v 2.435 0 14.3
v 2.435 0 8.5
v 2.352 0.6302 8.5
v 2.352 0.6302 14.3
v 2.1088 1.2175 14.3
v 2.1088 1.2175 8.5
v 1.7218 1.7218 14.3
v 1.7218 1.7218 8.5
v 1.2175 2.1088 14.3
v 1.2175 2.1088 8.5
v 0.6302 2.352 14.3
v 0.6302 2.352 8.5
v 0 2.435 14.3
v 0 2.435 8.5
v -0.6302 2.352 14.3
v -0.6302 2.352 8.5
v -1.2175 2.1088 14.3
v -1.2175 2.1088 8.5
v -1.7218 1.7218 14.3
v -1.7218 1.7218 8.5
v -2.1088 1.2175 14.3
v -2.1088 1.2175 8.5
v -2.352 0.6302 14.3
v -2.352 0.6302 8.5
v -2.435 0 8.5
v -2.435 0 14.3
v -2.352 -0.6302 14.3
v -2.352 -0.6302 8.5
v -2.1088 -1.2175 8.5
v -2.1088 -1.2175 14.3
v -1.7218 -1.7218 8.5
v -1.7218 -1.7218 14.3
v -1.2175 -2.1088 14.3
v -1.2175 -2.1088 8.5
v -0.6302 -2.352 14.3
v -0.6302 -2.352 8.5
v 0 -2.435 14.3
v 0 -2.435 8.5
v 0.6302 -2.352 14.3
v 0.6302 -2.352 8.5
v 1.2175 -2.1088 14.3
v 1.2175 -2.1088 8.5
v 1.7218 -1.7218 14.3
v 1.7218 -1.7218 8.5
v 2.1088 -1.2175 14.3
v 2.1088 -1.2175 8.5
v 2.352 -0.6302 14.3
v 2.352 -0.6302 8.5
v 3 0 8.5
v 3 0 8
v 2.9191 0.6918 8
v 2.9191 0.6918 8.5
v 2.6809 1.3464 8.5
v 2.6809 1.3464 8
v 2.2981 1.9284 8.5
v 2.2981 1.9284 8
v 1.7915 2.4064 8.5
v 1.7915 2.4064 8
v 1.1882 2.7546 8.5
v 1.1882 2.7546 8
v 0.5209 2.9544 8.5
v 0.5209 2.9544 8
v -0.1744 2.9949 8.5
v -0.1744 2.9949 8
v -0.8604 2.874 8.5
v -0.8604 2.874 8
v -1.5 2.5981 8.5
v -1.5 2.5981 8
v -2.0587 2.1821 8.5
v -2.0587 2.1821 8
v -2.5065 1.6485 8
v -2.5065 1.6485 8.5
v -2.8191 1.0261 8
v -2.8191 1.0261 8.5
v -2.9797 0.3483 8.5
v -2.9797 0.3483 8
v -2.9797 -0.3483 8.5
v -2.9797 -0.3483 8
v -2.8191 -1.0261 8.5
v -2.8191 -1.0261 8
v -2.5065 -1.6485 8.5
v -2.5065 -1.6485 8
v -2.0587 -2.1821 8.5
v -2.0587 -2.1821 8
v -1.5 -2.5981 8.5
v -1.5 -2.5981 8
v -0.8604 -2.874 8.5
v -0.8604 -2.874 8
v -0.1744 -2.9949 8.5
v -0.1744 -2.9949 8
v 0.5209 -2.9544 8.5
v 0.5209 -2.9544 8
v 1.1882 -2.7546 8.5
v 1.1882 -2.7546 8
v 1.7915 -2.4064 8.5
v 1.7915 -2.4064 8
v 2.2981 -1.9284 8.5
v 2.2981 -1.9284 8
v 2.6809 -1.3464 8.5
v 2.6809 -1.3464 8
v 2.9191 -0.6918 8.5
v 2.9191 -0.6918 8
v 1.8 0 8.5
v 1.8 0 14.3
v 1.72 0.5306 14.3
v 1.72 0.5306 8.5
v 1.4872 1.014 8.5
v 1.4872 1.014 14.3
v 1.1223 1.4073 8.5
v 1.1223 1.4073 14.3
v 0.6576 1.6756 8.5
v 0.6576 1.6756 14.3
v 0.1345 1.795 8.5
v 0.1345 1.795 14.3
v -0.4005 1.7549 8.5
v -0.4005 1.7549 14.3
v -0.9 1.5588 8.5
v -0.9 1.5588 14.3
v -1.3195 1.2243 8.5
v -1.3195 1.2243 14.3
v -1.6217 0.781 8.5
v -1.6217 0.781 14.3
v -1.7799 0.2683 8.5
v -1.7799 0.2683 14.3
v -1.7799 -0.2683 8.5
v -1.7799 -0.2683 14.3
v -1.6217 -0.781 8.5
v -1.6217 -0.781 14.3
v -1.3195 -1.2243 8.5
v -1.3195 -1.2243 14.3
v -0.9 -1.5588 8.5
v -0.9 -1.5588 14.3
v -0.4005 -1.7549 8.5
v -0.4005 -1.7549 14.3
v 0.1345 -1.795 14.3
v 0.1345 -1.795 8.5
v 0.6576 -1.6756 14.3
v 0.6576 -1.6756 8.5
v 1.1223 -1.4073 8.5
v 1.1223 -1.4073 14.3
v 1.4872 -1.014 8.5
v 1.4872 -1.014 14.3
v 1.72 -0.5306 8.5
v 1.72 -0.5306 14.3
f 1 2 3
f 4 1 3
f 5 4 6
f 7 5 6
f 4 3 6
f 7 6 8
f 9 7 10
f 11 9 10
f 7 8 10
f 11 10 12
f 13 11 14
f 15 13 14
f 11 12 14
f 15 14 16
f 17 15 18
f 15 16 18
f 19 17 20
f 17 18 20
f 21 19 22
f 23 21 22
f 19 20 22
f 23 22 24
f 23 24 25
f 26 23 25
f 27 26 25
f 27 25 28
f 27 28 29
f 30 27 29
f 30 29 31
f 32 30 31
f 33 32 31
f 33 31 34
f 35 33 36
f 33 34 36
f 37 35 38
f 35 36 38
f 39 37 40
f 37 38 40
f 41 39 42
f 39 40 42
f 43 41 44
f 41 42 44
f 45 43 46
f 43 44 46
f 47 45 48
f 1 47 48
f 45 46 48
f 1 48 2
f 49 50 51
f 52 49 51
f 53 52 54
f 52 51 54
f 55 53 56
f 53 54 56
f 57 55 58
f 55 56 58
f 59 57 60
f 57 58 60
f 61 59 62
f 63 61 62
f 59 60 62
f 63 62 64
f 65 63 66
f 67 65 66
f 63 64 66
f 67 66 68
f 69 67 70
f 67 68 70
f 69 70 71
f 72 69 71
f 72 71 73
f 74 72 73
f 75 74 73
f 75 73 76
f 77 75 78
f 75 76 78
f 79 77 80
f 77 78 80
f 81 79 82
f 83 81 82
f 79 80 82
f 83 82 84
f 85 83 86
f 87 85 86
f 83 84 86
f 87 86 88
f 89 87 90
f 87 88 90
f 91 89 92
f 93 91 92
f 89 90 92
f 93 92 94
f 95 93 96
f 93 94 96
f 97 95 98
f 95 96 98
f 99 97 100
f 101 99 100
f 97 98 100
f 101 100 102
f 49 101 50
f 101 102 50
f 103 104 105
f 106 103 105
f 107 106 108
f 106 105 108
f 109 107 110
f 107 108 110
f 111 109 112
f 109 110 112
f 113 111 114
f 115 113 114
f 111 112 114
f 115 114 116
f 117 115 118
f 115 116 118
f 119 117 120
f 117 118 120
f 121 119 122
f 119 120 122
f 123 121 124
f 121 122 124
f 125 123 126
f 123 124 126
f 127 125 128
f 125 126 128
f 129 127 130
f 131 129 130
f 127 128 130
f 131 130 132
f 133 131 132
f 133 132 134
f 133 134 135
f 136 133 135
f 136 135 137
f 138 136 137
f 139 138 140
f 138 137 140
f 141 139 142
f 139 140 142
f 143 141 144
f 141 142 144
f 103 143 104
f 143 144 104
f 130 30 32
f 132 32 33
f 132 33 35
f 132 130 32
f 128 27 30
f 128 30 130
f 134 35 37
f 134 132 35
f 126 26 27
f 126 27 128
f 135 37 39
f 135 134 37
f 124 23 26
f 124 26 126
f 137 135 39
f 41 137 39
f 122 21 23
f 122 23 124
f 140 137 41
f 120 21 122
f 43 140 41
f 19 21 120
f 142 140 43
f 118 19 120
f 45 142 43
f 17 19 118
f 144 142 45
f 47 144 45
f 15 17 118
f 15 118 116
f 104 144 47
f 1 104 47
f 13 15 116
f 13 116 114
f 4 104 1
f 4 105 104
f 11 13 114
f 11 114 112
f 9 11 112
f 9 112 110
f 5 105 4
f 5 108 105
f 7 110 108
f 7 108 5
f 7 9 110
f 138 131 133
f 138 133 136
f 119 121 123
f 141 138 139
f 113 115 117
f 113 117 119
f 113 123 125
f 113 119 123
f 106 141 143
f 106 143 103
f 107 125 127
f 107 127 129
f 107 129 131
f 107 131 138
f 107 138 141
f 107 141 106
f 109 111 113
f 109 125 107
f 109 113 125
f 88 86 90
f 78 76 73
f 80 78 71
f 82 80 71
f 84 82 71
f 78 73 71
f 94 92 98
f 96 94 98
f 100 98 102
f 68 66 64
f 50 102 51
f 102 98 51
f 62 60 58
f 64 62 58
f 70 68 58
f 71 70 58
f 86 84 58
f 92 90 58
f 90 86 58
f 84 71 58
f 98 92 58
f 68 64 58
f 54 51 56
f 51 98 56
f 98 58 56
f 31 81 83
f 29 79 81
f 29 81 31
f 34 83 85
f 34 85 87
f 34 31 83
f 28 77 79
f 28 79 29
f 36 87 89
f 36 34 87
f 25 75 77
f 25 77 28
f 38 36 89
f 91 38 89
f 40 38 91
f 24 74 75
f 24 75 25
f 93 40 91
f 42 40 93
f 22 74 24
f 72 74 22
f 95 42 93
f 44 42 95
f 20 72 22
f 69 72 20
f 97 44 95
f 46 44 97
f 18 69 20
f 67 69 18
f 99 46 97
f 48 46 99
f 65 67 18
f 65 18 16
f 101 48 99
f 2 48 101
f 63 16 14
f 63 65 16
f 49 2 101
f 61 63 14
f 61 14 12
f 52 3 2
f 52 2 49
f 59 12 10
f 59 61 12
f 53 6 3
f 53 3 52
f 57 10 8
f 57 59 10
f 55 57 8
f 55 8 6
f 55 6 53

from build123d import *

# Parameters (mm, degrees)
SKETCH_R     = 3
PAD_DEPTH    = 0.5
SKETCH001_R  = 2.435
PAD001_DEPTH = 5.8
SKETCH002_R  = 1.8
POCKET_DEPTH = 5.8


with BuildPart() as part:
    # Sketch (on Face1 of CopyBox) → Pad (new body)
    with BuildSketch(Plane.XY.offset(8)):
        Circle(SKETCH_R)
    extrude(amount=PAD_DEPTH)

    # Sketch001 (on Face3 of Pad) → Pad001 (join)
    with BuildSketch(Plane.XY.offset(8.5)):
        Circle(SKETCH001_R)
    extrude(amount=PAD001_DEPTH)

    # Sketch002 (on Face5 of Pad001) → Pocket (cut)
    with BuildSketch(Plane.XY.offset(14.3)):
        Circle(SKETCH002_R)
    extrude(amount=-POCKET_DEPTH, mode=Mode.SUBTRACT)


solid = part.part
